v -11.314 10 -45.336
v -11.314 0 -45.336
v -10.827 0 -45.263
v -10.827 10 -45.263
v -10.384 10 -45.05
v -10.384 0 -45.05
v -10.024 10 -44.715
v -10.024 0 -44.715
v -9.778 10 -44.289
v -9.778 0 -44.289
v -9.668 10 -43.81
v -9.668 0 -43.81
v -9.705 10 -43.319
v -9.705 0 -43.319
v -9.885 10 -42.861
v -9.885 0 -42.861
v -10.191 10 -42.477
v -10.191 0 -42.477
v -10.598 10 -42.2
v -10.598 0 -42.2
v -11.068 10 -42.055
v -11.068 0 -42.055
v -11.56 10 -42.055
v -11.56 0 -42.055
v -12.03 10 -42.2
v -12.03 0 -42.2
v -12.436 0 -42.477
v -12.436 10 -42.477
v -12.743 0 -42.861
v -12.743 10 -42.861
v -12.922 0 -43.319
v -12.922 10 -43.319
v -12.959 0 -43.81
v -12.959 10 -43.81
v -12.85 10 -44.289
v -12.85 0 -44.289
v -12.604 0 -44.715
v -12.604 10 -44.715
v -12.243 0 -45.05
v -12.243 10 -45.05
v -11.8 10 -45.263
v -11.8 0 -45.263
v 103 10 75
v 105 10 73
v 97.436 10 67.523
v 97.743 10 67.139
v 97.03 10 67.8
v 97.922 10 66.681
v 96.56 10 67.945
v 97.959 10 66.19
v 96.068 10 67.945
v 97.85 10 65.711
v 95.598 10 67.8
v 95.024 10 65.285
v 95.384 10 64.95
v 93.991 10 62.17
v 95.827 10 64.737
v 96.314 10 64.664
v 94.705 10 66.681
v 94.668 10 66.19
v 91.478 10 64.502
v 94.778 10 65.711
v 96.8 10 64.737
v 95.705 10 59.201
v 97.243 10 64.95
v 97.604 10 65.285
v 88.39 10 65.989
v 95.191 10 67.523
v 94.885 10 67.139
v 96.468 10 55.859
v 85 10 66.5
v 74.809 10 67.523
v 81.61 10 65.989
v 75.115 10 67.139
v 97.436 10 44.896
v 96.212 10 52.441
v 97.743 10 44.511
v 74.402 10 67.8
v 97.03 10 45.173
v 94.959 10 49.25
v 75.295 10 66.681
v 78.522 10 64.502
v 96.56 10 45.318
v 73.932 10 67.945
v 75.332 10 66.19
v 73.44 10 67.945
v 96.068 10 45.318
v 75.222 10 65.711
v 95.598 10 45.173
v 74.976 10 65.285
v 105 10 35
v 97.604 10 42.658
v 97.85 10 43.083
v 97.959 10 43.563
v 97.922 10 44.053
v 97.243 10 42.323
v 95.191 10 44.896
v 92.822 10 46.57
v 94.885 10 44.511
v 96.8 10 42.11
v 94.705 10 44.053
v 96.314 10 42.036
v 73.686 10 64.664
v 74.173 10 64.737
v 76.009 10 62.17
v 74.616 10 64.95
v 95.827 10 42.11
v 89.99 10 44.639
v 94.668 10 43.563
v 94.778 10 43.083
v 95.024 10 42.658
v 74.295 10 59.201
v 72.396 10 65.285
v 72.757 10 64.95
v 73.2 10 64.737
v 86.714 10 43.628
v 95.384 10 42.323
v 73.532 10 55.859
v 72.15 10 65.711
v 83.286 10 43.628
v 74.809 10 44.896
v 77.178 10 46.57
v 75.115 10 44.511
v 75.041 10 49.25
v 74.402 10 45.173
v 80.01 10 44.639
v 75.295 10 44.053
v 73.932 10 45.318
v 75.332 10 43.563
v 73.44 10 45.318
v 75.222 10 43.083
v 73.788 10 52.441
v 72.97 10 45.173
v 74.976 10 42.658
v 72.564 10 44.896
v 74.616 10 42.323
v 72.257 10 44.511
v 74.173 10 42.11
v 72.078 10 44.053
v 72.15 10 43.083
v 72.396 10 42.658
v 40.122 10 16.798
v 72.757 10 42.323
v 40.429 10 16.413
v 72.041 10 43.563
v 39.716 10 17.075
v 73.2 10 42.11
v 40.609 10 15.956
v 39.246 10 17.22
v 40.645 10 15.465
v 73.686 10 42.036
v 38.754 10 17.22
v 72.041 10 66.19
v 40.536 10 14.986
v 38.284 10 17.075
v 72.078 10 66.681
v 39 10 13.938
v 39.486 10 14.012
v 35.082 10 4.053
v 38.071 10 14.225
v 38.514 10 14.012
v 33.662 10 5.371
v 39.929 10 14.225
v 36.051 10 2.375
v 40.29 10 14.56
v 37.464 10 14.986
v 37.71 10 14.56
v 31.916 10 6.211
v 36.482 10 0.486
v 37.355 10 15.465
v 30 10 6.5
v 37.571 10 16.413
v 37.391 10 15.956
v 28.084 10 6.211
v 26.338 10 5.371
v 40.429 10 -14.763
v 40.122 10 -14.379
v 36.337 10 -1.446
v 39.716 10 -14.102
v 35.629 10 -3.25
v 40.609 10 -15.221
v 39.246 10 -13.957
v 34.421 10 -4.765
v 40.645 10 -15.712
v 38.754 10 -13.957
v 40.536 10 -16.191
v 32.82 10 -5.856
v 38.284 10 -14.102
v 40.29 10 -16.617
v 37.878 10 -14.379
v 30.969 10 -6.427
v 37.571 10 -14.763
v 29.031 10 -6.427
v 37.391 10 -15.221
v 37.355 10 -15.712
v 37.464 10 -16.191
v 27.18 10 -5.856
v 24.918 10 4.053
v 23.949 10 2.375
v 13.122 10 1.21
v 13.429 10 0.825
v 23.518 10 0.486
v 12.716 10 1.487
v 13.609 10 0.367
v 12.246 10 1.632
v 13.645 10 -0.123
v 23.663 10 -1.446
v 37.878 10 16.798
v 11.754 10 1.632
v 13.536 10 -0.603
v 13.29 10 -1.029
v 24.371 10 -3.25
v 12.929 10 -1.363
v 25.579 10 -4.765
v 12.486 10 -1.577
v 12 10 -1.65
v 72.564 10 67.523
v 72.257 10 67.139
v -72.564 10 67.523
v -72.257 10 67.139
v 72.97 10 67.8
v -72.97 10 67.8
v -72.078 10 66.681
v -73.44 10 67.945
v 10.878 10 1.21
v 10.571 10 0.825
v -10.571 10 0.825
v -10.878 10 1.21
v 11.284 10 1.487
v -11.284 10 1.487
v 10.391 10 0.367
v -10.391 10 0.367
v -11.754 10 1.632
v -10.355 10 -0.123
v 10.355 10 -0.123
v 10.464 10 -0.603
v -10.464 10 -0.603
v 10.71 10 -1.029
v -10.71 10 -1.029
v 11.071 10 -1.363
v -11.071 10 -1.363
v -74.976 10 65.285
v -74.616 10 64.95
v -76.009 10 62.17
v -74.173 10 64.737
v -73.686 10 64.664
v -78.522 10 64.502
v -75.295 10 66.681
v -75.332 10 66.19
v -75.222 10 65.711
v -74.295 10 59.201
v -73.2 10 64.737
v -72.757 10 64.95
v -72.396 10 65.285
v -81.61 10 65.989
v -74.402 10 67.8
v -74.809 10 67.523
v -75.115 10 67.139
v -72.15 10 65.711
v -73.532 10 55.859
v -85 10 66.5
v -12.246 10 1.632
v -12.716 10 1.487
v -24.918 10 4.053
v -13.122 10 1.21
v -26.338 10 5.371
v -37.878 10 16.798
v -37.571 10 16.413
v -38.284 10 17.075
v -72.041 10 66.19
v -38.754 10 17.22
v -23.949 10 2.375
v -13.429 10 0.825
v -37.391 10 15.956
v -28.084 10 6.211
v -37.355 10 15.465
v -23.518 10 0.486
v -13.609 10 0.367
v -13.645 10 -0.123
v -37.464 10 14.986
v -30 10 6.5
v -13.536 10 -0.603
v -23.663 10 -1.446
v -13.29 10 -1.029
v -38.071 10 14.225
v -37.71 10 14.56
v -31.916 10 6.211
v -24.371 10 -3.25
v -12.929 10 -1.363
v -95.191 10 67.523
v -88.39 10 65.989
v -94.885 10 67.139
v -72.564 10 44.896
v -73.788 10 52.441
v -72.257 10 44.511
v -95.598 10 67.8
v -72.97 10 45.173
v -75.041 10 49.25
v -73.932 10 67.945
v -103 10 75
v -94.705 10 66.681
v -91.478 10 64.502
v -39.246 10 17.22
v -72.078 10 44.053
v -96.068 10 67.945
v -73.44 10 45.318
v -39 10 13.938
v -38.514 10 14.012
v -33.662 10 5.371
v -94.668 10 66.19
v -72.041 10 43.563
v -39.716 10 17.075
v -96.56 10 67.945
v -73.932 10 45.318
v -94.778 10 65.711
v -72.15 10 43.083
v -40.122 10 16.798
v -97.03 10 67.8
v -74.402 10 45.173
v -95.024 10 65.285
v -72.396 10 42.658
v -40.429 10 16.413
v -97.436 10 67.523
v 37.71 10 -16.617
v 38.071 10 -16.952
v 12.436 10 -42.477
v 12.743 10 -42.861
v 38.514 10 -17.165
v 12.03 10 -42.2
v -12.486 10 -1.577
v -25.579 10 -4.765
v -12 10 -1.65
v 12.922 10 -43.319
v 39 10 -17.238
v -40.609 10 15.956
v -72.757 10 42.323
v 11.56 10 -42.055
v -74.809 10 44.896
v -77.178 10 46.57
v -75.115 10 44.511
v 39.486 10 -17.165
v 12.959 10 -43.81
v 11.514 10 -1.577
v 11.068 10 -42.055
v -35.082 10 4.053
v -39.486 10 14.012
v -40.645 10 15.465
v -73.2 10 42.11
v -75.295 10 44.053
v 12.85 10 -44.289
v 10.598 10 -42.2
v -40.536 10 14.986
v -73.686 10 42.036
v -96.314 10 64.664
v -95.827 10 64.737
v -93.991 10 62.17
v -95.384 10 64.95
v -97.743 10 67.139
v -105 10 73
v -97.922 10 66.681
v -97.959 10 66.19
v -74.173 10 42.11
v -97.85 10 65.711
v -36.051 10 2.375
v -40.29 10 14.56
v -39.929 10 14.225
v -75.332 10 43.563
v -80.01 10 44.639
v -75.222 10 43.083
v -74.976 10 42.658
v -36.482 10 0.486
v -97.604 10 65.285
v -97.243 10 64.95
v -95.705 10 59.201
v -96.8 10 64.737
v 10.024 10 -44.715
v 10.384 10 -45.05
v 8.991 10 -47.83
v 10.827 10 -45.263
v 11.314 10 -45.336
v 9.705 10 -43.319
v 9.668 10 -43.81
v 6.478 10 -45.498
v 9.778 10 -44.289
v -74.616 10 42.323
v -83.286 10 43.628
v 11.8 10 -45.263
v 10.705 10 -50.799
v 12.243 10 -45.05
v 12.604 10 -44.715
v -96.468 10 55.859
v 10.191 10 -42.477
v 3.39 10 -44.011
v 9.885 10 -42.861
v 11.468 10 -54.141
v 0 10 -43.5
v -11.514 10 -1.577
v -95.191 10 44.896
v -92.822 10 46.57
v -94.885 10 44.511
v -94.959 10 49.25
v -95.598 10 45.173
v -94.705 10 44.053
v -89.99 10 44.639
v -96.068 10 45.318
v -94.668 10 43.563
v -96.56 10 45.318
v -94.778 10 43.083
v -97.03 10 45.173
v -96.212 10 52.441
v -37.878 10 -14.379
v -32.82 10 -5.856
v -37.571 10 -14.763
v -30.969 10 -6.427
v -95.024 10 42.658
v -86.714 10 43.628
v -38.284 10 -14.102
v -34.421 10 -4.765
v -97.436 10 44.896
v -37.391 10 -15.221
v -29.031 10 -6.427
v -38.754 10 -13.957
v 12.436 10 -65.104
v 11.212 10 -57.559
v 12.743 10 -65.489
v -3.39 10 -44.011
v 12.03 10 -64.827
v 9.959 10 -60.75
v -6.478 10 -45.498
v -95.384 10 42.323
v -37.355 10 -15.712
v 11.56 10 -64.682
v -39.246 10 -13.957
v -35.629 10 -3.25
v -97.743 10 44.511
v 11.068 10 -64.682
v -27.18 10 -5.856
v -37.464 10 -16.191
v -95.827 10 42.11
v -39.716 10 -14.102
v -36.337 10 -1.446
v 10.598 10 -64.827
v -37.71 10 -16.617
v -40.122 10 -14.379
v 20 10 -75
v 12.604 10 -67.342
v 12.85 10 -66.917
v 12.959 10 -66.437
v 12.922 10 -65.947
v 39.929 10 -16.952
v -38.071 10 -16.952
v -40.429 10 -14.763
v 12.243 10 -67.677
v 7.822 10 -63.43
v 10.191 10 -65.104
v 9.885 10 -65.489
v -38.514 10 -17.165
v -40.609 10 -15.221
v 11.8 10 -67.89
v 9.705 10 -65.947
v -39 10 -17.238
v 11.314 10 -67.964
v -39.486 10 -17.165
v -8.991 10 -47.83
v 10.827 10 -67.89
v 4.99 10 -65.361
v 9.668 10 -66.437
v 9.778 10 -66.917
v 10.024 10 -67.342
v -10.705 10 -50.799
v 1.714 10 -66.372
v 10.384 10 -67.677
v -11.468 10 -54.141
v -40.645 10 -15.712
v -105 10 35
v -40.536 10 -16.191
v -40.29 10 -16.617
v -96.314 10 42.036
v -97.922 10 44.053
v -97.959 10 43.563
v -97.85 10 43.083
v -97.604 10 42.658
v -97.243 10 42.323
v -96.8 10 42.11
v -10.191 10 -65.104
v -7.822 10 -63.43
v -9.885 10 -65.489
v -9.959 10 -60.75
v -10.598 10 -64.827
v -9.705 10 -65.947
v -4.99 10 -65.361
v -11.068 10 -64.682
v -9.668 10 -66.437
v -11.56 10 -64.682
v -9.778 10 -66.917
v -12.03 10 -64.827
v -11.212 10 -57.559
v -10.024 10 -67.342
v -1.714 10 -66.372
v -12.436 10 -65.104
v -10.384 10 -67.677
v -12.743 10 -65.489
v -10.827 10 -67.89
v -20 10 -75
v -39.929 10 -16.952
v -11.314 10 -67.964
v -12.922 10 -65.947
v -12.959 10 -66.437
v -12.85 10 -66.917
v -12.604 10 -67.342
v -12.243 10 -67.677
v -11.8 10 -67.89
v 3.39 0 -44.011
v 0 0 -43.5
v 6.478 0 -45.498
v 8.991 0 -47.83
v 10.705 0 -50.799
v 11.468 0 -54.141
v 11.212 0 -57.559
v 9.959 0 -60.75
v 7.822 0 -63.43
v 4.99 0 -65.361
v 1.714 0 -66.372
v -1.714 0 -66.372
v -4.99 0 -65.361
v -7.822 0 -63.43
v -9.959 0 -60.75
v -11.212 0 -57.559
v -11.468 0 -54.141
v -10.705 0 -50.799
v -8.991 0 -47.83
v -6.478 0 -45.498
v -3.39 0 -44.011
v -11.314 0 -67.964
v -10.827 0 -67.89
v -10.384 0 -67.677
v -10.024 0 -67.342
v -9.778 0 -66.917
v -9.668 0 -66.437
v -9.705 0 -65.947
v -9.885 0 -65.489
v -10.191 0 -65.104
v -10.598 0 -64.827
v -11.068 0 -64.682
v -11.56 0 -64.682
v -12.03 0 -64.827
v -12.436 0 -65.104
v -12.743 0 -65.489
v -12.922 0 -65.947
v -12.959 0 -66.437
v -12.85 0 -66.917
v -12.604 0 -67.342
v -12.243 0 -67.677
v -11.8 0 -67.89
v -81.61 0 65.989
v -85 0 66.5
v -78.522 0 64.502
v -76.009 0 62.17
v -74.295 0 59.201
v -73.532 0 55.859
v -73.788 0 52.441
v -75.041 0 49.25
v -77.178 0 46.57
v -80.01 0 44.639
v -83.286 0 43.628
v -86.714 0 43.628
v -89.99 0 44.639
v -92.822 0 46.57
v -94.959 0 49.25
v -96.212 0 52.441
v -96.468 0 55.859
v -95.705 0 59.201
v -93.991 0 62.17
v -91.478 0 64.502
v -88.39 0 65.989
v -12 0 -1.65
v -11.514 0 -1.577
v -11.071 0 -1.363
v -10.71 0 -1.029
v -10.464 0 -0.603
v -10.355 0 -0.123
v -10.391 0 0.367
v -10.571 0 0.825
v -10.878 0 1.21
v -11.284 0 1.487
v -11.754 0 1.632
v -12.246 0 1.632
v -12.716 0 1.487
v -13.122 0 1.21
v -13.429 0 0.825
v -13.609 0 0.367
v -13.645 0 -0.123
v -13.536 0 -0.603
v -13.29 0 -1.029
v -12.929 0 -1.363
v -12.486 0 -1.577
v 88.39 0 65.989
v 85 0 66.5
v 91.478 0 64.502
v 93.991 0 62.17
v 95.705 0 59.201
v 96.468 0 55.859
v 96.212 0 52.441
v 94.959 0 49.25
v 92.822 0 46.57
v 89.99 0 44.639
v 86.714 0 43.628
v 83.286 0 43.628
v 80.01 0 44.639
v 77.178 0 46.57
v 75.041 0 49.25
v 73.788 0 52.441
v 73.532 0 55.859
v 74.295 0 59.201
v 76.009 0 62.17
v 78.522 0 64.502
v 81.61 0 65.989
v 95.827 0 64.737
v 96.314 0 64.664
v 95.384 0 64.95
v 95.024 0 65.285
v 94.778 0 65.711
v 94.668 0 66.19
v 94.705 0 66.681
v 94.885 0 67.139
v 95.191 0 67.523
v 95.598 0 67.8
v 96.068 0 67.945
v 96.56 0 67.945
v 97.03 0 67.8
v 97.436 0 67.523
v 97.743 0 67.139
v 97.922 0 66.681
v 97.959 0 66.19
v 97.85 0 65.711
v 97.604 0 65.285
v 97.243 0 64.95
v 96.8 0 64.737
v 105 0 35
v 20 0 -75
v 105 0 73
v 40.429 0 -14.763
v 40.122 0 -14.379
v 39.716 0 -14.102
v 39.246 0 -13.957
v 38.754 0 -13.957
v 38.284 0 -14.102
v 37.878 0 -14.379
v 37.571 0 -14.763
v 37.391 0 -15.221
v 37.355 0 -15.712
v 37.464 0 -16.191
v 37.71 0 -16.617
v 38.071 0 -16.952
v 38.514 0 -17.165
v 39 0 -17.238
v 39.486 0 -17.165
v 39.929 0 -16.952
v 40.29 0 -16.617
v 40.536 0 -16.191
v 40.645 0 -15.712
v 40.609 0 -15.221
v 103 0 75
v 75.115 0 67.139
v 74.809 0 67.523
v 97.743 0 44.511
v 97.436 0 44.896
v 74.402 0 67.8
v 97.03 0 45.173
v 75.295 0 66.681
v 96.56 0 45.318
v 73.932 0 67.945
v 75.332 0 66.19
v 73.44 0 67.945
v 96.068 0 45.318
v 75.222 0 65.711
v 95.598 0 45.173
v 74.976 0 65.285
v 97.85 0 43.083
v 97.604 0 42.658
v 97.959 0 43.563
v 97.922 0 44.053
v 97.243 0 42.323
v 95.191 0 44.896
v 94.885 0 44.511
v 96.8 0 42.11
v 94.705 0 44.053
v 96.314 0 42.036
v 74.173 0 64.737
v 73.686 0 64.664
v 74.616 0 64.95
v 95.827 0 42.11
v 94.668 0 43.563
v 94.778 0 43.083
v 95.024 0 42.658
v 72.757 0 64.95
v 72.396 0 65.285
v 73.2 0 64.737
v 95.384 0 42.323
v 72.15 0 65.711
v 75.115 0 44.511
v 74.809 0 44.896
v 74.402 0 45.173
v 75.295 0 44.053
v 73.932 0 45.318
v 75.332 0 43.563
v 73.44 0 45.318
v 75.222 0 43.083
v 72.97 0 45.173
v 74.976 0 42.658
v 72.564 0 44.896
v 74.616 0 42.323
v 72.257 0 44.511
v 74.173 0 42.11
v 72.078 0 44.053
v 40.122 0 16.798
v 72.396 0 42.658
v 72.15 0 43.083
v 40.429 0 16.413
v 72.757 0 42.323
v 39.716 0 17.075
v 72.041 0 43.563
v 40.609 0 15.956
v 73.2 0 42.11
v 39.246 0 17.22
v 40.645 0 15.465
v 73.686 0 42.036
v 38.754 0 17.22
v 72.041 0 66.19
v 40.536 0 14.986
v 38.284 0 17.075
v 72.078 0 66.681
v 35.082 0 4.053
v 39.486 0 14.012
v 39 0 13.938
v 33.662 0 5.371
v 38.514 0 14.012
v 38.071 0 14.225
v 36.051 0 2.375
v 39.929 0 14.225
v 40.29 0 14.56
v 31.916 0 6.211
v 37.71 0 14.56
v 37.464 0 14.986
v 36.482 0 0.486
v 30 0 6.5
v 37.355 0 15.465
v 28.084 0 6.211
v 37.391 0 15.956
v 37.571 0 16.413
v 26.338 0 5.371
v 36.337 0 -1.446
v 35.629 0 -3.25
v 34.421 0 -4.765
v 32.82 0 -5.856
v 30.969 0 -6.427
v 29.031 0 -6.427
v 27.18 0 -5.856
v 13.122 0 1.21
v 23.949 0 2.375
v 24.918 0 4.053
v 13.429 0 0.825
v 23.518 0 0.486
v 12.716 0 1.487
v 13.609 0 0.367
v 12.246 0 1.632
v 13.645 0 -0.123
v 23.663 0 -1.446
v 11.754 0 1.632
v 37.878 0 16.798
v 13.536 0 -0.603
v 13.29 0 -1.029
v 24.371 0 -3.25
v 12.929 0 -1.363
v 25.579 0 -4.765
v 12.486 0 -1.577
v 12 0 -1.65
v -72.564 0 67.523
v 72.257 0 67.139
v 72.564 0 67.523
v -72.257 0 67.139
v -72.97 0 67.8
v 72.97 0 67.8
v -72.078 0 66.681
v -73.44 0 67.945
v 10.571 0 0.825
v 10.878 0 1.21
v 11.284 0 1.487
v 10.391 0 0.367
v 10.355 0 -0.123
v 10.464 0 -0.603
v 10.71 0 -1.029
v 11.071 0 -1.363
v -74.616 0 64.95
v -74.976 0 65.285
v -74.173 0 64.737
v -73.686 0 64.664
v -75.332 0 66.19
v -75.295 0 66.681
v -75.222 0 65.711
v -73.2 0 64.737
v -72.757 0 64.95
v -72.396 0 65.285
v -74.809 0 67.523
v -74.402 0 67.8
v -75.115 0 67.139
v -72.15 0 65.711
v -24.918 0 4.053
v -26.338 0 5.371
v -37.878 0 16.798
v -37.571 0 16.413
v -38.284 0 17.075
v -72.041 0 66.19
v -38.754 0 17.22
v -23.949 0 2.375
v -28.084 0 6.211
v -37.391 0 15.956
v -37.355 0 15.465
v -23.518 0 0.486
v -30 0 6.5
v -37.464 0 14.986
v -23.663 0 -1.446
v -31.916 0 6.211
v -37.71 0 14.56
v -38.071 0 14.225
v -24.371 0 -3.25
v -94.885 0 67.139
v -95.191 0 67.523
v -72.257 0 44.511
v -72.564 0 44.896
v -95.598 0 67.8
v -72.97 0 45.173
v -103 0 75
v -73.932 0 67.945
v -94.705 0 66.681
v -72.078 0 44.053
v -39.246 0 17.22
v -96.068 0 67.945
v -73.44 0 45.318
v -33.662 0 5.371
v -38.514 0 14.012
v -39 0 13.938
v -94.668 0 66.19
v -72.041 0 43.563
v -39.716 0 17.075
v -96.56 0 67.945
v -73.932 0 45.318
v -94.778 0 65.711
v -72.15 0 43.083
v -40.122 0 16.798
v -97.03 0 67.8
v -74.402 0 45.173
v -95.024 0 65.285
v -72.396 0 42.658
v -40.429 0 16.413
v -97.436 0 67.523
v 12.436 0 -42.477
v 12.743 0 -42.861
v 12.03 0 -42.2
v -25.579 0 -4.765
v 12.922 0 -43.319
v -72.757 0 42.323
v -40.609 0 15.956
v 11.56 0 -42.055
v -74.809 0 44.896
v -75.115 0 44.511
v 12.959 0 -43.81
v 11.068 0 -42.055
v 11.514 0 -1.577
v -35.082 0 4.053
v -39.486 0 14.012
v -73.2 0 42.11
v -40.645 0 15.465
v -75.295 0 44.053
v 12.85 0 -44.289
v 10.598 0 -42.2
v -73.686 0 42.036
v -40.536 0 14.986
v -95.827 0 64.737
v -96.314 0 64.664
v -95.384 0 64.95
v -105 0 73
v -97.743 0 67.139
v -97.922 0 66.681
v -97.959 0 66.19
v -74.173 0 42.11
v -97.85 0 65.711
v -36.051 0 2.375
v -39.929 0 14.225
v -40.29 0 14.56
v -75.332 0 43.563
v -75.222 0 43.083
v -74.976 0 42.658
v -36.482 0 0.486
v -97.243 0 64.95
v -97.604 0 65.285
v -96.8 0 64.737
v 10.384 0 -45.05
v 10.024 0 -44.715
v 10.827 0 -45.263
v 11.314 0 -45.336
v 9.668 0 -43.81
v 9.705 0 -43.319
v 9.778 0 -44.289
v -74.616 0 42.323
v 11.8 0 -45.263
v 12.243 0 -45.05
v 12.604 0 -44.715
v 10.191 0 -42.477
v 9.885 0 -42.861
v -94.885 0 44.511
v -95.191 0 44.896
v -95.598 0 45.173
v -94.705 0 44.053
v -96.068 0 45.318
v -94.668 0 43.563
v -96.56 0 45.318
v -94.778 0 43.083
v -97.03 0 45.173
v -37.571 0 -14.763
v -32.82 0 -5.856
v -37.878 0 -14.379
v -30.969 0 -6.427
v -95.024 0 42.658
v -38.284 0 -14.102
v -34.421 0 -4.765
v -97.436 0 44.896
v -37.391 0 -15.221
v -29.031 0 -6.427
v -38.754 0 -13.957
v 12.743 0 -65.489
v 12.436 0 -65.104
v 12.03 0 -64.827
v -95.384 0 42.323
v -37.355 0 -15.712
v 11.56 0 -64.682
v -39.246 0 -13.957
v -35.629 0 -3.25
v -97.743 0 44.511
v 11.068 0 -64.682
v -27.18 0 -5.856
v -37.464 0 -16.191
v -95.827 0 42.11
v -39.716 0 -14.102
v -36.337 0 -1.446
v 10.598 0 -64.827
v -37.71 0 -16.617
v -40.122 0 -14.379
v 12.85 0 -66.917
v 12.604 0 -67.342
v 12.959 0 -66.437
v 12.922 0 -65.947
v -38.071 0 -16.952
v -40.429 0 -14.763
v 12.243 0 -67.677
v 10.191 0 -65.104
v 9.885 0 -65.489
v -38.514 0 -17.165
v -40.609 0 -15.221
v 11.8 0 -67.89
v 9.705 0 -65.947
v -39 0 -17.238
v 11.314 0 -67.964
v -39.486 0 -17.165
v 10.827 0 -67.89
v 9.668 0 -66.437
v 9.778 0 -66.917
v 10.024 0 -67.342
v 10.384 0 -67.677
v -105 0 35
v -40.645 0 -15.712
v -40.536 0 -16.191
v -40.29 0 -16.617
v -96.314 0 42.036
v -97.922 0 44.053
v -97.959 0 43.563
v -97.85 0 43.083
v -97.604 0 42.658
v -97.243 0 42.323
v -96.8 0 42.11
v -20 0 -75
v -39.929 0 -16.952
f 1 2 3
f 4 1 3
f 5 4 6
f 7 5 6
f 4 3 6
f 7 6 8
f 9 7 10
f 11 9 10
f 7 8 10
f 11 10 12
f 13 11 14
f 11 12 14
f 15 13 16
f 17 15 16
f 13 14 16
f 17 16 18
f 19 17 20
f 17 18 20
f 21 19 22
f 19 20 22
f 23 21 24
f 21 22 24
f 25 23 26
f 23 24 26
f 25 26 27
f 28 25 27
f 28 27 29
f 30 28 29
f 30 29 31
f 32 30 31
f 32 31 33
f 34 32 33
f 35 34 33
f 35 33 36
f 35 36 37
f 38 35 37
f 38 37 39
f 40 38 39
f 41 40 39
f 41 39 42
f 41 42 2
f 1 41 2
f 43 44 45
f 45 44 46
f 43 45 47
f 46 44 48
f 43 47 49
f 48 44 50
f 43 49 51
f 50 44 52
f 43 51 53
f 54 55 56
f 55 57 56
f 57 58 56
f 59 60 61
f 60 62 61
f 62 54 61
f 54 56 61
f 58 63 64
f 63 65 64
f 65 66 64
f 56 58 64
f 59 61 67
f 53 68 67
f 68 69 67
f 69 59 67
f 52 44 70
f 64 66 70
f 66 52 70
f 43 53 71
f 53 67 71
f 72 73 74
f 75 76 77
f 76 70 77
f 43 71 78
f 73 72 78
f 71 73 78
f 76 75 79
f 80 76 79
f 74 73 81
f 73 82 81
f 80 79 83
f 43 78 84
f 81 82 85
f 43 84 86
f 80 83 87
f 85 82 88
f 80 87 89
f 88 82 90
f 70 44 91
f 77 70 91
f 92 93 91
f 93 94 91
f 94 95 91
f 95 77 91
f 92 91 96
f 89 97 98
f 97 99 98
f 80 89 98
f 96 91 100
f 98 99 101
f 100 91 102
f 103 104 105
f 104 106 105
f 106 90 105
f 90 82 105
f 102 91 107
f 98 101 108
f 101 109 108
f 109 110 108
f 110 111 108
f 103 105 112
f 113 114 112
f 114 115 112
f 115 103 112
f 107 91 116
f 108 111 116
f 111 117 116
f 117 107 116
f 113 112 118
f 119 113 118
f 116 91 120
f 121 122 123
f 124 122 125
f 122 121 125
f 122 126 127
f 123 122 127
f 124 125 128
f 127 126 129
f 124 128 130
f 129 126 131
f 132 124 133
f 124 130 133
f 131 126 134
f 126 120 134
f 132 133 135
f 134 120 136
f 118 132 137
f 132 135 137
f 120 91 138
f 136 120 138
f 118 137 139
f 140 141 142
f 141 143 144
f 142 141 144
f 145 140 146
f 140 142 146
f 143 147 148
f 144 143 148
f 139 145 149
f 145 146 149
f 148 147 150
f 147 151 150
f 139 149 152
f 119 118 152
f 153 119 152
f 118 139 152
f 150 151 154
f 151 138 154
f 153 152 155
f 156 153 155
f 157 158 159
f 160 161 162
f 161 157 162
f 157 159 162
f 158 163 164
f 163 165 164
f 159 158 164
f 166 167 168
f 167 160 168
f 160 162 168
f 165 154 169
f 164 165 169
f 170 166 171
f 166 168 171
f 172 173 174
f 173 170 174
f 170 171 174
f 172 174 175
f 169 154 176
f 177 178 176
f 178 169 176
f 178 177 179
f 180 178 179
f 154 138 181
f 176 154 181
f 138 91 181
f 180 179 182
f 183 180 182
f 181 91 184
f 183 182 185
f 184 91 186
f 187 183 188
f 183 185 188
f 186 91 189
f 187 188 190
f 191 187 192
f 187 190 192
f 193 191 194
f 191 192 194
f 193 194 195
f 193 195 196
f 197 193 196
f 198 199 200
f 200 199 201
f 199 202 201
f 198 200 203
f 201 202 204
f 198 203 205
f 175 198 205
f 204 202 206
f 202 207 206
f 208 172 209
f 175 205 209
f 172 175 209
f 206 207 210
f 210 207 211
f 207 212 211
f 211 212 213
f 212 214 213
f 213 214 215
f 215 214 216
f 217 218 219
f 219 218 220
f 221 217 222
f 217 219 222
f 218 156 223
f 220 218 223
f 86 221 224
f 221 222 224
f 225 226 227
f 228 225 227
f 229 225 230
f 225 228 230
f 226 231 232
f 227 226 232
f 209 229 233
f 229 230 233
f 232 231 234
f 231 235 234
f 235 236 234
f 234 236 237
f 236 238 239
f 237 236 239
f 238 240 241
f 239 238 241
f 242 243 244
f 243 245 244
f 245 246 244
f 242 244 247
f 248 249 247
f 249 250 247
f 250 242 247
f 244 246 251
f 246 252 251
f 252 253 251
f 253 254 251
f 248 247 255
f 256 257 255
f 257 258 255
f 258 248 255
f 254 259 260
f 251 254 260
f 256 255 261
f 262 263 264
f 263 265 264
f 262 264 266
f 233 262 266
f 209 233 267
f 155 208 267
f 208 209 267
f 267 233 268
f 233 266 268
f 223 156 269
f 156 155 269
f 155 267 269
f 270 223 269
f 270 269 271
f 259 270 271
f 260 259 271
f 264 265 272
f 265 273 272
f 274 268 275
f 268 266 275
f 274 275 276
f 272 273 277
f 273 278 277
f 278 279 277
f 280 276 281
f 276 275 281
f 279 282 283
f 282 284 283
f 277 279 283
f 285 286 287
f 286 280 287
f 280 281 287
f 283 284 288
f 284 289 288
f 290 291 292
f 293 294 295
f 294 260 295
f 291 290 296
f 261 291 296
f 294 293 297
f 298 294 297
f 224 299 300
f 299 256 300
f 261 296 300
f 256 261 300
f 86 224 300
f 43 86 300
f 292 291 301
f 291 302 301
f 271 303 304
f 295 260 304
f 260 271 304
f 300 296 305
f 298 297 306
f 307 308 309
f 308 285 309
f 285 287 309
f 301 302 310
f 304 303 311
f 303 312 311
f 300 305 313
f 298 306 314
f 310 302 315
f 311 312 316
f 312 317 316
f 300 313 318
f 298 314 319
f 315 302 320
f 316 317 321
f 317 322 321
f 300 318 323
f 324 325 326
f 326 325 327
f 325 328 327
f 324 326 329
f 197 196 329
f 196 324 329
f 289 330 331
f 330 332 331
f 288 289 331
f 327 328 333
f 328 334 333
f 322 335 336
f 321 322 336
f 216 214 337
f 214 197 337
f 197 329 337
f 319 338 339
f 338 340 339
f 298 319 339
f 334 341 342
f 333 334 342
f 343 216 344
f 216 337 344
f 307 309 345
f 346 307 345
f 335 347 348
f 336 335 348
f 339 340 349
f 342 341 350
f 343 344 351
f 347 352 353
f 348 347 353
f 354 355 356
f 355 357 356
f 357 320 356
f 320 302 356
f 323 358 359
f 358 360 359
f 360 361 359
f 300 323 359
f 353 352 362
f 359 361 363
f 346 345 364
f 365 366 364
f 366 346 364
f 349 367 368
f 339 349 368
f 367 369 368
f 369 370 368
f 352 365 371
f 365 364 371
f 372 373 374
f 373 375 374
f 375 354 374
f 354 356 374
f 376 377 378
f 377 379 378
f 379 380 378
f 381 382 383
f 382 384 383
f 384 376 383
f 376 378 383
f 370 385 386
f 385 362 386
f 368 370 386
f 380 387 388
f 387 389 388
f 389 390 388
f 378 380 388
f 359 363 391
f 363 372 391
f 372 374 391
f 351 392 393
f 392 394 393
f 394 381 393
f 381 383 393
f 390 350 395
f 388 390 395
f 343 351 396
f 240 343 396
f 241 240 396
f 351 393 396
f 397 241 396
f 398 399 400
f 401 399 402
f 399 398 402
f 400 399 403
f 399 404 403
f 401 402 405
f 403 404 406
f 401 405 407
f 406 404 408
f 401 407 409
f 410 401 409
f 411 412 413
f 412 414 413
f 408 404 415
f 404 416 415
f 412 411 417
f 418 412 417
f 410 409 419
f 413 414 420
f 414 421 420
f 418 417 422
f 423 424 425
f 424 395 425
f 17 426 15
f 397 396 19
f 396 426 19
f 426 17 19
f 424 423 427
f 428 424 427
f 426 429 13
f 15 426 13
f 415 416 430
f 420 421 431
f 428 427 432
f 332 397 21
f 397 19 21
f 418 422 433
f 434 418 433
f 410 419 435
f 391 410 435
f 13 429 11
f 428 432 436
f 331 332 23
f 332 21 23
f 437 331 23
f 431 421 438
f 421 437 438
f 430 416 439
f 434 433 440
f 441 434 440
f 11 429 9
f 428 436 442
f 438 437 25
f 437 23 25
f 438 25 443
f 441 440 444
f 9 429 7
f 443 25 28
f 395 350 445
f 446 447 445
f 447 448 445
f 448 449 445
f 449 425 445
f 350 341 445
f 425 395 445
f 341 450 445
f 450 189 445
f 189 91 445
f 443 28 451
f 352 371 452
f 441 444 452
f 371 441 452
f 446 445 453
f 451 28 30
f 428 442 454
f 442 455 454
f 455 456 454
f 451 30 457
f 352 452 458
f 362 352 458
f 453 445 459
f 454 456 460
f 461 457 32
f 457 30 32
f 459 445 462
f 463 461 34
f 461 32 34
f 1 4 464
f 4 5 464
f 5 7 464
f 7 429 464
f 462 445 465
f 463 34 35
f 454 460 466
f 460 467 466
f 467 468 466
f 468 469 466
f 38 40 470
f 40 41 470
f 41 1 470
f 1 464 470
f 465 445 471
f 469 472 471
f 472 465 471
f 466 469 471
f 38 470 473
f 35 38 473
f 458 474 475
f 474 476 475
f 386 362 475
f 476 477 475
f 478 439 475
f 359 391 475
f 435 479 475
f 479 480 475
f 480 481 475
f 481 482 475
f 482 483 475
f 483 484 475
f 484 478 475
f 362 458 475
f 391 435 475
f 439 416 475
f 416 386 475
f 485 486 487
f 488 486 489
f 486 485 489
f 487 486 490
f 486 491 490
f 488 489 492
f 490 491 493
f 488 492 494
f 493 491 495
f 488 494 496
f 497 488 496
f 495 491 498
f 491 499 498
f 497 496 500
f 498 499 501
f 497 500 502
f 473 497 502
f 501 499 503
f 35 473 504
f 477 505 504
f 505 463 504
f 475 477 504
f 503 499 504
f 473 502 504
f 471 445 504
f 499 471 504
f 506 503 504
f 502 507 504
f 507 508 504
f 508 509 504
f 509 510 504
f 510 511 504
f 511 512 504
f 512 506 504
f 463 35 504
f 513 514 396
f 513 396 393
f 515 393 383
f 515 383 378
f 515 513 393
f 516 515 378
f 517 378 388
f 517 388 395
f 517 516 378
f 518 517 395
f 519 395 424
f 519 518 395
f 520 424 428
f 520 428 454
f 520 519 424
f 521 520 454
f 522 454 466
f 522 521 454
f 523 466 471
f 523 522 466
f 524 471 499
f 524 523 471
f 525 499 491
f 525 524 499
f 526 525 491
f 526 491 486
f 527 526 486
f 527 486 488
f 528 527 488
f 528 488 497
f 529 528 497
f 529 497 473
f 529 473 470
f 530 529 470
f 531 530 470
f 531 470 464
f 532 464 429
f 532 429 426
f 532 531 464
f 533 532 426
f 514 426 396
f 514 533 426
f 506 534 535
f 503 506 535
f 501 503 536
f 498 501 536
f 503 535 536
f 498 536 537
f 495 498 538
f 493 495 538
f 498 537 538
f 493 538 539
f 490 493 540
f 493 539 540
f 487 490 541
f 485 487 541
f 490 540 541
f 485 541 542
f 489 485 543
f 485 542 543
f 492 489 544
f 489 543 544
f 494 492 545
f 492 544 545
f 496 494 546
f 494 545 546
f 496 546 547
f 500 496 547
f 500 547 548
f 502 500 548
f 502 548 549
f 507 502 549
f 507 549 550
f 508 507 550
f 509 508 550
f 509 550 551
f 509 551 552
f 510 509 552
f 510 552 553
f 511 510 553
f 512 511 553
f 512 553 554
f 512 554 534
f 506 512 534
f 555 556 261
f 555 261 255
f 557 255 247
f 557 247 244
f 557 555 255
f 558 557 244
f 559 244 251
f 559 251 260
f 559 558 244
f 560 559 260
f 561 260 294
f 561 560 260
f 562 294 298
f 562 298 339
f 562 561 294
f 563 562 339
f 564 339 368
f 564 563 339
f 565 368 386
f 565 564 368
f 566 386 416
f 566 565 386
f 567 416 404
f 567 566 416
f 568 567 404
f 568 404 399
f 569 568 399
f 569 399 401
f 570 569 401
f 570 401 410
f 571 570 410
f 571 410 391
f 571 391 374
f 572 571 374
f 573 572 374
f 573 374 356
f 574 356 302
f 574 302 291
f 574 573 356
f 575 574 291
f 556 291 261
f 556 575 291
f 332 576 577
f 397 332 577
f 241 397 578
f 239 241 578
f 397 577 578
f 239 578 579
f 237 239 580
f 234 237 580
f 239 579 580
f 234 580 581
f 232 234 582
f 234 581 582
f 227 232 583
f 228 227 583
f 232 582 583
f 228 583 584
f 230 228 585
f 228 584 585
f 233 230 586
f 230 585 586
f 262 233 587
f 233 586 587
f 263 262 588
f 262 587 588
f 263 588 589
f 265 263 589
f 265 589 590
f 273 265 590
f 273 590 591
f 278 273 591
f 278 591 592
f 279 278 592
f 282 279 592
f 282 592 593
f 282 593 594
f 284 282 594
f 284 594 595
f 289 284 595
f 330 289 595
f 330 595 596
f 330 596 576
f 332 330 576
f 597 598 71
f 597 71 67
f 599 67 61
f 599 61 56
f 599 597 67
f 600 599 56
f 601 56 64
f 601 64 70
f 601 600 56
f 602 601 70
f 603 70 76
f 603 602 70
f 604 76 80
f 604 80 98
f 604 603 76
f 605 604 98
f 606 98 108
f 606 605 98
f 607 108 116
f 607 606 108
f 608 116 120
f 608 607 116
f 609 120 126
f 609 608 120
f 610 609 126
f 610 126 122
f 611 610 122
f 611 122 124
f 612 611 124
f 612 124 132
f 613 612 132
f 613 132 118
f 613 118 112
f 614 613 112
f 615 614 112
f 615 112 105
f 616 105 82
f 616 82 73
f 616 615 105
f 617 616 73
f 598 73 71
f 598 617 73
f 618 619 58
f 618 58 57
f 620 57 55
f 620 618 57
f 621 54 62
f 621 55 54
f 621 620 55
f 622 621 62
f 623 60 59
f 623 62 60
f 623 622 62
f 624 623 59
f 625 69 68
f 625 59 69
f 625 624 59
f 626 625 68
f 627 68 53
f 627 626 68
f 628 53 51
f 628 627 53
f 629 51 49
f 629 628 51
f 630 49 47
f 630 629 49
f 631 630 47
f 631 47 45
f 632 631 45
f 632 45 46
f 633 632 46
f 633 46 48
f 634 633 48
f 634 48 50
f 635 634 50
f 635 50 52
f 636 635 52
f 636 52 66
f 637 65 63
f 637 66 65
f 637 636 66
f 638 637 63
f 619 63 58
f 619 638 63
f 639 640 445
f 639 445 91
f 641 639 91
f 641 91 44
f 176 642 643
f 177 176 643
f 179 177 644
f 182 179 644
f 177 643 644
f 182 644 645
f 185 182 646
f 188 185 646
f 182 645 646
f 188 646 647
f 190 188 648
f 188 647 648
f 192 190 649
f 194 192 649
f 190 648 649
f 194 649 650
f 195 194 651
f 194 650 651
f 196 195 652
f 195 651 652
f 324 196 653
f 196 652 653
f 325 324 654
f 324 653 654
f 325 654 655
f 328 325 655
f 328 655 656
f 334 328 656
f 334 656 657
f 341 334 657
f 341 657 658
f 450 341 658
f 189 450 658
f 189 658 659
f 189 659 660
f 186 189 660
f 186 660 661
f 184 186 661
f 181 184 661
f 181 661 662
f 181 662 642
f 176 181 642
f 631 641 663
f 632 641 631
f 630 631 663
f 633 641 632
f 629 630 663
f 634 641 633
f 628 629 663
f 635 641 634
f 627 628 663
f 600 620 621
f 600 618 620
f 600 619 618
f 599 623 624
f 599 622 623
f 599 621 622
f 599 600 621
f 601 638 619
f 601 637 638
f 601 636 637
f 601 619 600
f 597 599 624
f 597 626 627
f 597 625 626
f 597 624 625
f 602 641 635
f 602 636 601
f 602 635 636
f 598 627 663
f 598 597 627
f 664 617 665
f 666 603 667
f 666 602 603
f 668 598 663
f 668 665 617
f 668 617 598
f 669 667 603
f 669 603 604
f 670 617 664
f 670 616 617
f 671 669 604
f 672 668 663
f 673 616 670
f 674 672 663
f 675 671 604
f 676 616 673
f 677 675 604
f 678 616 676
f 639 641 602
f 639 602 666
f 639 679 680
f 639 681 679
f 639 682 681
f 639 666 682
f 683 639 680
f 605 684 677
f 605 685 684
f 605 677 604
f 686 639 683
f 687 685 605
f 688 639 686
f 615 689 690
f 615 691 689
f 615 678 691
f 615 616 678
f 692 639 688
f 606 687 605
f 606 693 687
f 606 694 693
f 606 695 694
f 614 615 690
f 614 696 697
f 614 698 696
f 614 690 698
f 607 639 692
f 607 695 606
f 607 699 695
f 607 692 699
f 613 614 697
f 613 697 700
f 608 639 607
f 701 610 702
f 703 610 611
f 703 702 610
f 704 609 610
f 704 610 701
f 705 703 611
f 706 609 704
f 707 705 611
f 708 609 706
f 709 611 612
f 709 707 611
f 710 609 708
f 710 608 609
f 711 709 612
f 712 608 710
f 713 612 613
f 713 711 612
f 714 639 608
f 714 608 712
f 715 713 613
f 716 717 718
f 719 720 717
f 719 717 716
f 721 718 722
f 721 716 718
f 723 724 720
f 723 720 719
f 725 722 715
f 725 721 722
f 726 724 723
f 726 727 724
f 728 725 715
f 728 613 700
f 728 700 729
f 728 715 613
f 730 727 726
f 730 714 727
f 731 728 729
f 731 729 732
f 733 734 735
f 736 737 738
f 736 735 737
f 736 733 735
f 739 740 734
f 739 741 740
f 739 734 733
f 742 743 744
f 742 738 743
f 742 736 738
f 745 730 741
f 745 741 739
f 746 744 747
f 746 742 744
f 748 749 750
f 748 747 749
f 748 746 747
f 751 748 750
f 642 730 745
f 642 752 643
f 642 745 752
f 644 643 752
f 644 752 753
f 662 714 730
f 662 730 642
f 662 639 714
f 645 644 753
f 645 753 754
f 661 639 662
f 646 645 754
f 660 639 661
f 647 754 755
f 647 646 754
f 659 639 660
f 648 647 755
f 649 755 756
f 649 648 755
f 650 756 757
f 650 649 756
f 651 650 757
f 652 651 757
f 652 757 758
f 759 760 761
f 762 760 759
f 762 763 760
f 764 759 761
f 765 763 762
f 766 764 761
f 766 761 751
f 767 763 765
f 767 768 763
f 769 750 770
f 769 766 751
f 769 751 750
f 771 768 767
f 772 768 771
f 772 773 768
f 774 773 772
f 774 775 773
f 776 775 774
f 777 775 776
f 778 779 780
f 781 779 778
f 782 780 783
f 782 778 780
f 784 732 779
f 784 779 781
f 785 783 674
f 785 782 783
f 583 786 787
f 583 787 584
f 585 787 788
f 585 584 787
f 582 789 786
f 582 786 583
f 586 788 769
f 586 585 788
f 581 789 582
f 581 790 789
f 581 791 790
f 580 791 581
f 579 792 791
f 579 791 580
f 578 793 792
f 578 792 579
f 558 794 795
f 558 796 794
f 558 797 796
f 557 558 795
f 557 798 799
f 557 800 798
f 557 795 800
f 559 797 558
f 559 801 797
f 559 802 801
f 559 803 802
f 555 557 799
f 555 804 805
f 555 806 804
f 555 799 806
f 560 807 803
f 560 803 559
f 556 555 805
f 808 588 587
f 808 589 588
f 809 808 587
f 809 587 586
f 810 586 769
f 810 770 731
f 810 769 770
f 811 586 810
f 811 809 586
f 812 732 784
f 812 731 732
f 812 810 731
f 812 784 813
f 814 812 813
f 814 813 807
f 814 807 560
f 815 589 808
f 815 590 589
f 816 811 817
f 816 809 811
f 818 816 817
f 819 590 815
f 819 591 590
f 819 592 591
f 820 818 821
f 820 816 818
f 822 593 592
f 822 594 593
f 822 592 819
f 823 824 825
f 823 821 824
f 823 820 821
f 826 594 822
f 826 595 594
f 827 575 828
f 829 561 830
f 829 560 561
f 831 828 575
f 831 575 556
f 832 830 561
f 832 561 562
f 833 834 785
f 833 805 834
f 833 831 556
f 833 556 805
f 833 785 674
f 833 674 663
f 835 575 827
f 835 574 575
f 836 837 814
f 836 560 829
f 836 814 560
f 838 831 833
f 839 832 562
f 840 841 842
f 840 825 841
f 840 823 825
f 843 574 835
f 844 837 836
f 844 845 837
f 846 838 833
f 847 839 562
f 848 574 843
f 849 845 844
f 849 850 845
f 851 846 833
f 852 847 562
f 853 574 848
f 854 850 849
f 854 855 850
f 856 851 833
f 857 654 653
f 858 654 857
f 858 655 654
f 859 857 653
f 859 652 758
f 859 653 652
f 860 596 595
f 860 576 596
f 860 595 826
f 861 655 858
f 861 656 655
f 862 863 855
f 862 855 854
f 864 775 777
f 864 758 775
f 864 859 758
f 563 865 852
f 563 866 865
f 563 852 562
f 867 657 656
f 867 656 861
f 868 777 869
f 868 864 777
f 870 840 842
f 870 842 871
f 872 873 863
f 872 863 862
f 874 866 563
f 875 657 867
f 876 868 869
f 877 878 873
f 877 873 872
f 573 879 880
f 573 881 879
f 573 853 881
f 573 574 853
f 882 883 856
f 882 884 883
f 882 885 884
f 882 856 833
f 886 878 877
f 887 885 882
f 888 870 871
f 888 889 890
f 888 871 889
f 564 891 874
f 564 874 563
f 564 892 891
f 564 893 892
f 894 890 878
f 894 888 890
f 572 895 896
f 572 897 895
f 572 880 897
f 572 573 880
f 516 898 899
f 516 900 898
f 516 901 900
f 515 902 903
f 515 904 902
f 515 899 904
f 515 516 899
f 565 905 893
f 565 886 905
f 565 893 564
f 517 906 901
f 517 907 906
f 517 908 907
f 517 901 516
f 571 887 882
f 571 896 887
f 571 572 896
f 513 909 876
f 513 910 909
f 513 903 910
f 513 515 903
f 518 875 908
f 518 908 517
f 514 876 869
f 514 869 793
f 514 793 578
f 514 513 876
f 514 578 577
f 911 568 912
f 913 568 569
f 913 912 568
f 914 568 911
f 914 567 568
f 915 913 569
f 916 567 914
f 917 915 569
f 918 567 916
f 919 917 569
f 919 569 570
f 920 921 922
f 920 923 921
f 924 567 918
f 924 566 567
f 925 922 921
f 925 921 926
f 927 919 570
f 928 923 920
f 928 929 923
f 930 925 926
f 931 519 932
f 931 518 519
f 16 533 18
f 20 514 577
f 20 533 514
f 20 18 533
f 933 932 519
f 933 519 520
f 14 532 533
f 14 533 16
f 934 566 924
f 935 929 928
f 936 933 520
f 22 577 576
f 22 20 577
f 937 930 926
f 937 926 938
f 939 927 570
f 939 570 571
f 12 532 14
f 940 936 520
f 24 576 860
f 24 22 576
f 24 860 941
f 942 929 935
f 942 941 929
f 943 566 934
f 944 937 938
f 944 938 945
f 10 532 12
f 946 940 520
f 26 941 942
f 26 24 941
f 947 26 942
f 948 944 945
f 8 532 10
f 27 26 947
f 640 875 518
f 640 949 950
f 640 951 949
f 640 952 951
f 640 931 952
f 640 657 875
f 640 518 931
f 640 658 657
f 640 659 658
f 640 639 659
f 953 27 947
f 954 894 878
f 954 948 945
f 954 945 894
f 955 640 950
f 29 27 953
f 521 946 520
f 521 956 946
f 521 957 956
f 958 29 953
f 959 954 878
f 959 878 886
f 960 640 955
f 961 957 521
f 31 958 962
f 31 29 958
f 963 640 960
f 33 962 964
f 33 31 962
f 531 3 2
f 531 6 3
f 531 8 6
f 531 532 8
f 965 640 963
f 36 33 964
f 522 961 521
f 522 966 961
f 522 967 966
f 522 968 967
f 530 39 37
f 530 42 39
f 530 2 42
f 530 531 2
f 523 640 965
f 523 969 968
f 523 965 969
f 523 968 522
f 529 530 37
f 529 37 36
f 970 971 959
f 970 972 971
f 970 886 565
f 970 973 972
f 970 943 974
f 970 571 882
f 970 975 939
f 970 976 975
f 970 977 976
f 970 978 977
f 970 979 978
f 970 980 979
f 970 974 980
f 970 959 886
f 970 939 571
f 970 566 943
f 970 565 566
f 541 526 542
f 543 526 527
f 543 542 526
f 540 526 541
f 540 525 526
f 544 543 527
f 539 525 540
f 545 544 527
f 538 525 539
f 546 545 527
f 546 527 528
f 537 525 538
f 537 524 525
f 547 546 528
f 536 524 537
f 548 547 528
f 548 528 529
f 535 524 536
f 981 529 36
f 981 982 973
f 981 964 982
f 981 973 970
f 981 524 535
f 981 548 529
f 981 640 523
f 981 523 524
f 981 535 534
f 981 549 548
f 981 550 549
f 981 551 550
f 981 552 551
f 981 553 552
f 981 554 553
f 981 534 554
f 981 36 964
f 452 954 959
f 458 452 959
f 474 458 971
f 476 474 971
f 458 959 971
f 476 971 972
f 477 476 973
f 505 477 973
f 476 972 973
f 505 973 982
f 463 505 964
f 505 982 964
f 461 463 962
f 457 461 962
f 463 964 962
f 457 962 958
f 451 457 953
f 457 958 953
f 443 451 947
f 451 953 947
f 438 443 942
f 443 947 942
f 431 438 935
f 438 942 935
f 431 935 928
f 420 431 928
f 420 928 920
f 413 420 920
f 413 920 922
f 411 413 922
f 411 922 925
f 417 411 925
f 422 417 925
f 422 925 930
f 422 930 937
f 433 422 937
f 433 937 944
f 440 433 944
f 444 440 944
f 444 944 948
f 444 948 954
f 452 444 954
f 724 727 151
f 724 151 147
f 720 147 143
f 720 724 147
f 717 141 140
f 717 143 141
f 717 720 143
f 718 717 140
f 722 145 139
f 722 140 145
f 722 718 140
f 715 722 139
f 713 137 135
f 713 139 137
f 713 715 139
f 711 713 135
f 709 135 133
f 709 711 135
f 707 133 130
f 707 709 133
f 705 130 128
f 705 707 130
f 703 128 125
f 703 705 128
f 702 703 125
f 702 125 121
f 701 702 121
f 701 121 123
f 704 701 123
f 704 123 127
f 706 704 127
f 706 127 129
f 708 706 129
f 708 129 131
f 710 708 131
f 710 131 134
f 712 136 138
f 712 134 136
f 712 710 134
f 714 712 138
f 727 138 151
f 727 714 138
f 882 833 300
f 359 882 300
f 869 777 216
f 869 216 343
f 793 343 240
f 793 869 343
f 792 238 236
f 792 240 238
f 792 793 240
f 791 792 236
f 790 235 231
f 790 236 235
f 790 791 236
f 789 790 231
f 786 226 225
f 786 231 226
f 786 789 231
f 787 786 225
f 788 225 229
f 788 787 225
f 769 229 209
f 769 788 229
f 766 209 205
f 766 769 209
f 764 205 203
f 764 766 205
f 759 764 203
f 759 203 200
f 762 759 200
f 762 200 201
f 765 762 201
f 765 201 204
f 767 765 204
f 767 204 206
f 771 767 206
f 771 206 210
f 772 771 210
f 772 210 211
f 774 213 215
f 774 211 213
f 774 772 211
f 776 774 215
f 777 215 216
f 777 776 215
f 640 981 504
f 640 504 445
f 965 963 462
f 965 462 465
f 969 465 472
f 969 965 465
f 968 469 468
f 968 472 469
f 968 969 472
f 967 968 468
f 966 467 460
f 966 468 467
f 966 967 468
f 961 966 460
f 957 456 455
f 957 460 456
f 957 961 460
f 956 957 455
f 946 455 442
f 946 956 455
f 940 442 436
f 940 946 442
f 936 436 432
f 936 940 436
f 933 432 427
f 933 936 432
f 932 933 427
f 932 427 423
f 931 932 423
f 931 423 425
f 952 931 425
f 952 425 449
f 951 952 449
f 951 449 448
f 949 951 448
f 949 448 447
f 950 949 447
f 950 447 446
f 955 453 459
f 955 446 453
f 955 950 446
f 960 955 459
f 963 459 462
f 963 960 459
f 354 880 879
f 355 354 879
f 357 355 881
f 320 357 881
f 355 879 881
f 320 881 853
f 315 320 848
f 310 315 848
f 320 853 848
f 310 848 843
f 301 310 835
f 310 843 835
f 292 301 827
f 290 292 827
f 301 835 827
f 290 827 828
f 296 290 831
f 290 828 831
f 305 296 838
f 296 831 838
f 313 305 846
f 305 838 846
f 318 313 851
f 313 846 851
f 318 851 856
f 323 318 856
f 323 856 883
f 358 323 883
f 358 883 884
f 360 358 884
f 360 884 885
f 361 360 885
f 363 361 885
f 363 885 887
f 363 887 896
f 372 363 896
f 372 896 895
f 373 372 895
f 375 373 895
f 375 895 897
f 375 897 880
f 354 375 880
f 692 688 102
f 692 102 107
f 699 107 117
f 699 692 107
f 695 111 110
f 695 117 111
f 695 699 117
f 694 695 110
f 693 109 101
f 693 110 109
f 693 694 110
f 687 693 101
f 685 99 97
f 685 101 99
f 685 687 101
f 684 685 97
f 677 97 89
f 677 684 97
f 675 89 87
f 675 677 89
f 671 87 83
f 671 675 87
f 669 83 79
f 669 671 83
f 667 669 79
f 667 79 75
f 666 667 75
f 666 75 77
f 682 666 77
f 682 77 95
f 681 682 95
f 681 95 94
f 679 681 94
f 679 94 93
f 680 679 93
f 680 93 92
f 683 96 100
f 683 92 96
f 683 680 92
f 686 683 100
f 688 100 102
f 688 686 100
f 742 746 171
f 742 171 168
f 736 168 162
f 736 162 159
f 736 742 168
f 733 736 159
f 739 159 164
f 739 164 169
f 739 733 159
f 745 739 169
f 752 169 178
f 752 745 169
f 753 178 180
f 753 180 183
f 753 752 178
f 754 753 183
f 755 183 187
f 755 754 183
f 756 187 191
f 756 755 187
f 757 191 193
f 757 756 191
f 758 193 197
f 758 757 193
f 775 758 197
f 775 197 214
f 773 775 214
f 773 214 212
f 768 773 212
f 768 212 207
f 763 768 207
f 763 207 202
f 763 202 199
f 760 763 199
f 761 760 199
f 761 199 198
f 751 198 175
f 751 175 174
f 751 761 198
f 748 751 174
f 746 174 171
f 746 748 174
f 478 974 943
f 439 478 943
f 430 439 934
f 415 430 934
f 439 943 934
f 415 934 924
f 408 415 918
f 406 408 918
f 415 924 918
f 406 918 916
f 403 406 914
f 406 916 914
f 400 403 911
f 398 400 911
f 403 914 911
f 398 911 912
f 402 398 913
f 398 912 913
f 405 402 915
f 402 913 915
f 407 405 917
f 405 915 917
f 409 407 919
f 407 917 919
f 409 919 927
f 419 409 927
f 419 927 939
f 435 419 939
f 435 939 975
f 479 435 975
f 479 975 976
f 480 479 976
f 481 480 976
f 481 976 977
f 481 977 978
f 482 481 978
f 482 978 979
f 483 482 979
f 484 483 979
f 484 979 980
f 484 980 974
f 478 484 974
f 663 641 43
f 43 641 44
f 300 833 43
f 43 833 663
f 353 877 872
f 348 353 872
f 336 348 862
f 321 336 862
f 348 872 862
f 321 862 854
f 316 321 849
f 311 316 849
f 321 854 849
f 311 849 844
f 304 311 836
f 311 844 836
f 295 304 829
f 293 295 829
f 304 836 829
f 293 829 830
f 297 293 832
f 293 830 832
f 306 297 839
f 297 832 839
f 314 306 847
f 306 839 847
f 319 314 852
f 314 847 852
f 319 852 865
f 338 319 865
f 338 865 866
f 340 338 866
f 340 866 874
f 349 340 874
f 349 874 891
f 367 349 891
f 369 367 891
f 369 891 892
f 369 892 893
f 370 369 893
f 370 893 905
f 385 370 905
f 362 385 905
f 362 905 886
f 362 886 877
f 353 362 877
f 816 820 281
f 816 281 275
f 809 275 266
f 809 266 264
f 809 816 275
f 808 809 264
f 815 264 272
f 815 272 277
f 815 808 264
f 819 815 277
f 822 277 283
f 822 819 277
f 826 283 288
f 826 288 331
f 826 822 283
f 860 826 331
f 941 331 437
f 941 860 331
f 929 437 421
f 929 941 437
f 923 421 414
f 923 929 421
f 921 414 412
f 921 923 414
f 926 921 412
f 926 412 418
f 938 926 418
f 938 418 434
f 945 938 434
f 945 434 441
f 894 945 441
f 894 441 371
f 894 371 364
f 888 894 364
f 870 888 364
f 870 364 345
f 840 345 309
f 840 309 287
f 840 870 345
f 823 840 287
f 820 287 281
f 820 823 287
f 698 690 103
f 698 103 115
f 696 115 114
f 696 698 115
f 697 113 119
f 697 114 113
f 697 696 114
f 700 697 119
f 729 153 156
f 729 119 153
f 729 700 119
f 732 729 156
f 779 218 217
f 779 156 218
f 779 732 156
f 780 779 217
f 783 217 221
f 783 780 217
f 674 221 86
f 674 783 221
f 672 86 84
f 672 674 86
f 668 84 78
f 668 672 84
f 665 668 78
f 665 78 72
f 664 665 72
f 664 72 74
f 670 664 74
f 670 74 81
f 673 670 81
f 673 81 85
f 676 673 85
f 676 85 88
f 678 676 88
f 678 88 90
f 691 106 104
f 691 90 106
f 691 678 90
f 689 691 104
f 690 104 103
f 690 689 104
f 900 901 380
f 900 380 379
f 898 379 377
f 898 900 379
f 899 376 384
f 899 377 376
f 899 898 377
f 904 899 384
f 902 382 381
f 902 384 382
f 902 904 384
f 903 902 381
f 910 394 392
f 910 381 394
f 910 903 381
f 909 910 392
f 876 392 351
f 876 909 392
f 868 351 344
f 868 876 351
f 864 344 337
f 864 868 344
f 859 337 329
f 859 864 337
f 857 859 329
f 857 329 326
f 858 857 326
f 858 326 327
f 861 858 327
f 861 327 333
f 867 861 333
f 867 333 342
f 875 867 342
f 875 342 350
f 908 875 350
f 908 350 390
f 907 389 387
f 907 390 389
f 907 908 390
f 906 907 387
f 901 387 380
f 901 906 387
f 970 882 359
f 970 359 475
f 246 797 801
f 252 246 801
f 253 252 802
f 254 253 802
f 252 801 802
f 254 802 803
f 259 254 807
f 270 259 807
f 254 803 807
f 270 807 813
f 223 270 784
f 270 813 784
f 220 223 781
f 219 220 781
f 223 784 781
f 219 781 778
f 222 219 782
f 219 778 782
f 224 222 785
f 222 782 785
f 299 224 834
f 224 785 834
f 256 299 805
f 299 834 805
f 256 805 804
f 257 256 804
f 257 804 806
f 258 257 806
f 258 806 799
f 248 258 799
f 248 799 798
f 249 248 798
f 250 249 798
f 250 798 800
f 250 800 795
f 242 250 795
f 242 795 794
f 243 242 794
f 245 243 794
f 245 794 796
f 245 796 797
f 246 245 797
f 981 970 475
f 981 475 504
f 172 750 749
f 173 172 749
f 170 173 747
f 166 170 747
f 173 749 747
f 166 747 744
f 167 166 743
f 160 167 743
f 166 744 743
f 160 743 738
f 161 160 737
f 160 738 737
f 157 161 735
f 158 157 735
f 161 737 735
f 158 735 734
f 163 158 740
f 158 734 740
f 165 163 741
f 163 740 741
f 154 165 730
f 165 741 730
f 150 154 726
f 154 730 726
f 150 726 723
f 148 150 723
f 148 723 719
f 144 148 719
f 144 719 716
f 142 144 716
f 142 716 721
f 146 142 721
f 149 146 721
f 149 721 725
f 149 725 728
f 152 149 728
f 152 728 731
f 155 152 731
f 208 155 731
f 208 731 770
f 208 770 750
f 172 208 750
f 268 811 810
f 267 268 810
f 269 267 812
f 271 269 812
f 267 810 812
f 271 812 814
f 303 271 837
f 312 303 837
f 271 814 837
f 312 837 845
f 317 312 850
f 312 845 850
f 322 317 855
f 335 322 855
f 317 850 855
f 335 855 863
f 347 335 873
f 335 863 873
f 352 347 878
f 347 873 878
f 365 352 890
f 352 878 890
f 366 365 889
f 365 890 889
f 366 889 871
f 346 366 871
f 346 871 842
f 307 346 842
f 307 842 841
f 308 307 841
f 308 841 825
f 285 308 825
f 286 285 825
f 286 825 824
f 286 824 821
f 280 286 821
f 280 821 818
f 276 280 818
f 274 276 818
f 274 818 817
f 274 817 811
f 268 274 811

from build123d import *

# Parameters (mm, degrees)
SKETCH1_R             = 6.5
SKETCH1_R_2           = 11.5
BOSS_EXTRUDE1_DEPTH   = 10
CHAMFER1_SIZE         = 2
M4X0_7_TAPPED_HOLE1_D = 3.3
M4X0_7_TAPPED_HOLE2_D = 3.3
CIRPATTERN1_COUNT     = 3
MIRROR1_COPY_1_D      = 3.3
MIRROR1_COPY_2_D      = 3.3


with BuildPart() as part:
    # Sketch1 → Boss-Extrude1 (new body)
    with BuildSketch(Plane(origin=(0, 0, 0), x_dir=(1, 0, 0), z_dir=(0, 1, 0))):
        Polygon((-105, -35), (-20, 75), (20, 75), (105, -35), (105, -75), (65, -75), (-65, -75), (-105, -75), align=None)
        with Locations(Location((-30, 0, 0), (0, 0, 270))):
            Circle(SKETCH1_R, mode=Mode.SUBTRACT)
        with Locations(Location((30, 0, 0), (0, 0, 270))):
            Circle(SKETCH1_R, mode=Mode.SUBTRACT)
        with Locations(Location((0, 55, 0), (0, 0, 270))):
            Circle(SKETCH1_R_2, mode=Mode.SUBTRACT)
        with Locations(Location((85, -55, 0), (0, 0, 270))):
            Circle(SKETCH1_R_2, mode=Mode.SUBTRACT)
        with Locations(Location((-85, -55, 0), (0, 0, 270))):
            Circle(SKETCH1_R_2, mode=Mode.SUBTRACT)
    extrude(amount=BOSS_EXTRUDE1_DEPTH)

    # Chamfer1
    chamfer1_edges = [part.edges().sort_by_distance(p)[0] for p in [
        (105, 5, 75),
        (-105, 5, 75),
    ]]
    chamfer(chamfer1_edges, length=CHAMFER1_SIZE)

    # M4x0.7 Tapped Hole1 (through all)
    with Locations(Plane(origin=(-96.313708499, 10, 43.686291501), x_dir=(0, 0, 1), z_dir=(0, 1, 0))):
        with Locations((0, 0), (0, 22.627416998), (22.627416998, 22.627416998), (22.627416998, 0), (-87.372583002, 85), (-110, 85)):
            m4x0_7_tapped_hole1 = Hole(M4X0_7_TAPPED_HOLE1_D / 2)

    # M4x0.7 Tapped Hole2 (through all)
    with Locations(Plane(origin=(-12, 10, 0), x_dir=(0, 0, 1), z_dir=(0, 1, 0))):
        with Locations((0, 0)):
            m4x0_7_tapped_hole2 = Hole(M4X0_7_TAPPED_HOLE2_D / 2)

    # CirPattern1: M4x0.7 Tapped Hole2 ×3 about axis
    cirpattern1_axis = Axis((-30, 0, 0), (0, 1, 0))
    for i in range(1, CIRPATTERN1_COUNT):
        add(m4x0_7_tapped_hole2.rotate(cirpattern1_axis, i * 360 / CIRPATTERN1_COUNT), mode=Mode.SUBTRACT)

    # Mirror1: M4x0.7 Tapped Hole1, M4x0.7 Tapped Hole2 across plane
    add(m4x0_7_tapped_hole1.mirror(Plane(origin=(0, 0, 0), x_dir=(0, 0, 1), z_dir=(1, 0, 0))), mode=Mode.SUBTRACT)
    add(m4x0_7_tapped_hole2.mirror(Plane(origin=(0, 0, 0), x_dir=(0, 0, 1), z_dir=(1, 0, 0))), mode=Mode.SUBTRACT)

    # Mirror1 copy 1 (through all)
    with Locations(Plane(origin=(39, 10, -15.588457268), x_dir=(-0.8660254037844387, 0, -0.4999999999999998), z_dir=(0, 1, 0))):
        with Locations((0, 0)):
            Hole(MIRROR1_COPY_1_D / 2)

    # Mirror1 copy 2 (through all)
    with Locations(Plane(origin=(39, 10, 15.588457268), x_dir=(0.8660254037844384, 0, -0.5000000000000004), z_dir=(0, 1, 0))):
        with Locations((0, 0)):
            Hole(MIRROR1_COPY_2_D / 2)


solid = part.part
